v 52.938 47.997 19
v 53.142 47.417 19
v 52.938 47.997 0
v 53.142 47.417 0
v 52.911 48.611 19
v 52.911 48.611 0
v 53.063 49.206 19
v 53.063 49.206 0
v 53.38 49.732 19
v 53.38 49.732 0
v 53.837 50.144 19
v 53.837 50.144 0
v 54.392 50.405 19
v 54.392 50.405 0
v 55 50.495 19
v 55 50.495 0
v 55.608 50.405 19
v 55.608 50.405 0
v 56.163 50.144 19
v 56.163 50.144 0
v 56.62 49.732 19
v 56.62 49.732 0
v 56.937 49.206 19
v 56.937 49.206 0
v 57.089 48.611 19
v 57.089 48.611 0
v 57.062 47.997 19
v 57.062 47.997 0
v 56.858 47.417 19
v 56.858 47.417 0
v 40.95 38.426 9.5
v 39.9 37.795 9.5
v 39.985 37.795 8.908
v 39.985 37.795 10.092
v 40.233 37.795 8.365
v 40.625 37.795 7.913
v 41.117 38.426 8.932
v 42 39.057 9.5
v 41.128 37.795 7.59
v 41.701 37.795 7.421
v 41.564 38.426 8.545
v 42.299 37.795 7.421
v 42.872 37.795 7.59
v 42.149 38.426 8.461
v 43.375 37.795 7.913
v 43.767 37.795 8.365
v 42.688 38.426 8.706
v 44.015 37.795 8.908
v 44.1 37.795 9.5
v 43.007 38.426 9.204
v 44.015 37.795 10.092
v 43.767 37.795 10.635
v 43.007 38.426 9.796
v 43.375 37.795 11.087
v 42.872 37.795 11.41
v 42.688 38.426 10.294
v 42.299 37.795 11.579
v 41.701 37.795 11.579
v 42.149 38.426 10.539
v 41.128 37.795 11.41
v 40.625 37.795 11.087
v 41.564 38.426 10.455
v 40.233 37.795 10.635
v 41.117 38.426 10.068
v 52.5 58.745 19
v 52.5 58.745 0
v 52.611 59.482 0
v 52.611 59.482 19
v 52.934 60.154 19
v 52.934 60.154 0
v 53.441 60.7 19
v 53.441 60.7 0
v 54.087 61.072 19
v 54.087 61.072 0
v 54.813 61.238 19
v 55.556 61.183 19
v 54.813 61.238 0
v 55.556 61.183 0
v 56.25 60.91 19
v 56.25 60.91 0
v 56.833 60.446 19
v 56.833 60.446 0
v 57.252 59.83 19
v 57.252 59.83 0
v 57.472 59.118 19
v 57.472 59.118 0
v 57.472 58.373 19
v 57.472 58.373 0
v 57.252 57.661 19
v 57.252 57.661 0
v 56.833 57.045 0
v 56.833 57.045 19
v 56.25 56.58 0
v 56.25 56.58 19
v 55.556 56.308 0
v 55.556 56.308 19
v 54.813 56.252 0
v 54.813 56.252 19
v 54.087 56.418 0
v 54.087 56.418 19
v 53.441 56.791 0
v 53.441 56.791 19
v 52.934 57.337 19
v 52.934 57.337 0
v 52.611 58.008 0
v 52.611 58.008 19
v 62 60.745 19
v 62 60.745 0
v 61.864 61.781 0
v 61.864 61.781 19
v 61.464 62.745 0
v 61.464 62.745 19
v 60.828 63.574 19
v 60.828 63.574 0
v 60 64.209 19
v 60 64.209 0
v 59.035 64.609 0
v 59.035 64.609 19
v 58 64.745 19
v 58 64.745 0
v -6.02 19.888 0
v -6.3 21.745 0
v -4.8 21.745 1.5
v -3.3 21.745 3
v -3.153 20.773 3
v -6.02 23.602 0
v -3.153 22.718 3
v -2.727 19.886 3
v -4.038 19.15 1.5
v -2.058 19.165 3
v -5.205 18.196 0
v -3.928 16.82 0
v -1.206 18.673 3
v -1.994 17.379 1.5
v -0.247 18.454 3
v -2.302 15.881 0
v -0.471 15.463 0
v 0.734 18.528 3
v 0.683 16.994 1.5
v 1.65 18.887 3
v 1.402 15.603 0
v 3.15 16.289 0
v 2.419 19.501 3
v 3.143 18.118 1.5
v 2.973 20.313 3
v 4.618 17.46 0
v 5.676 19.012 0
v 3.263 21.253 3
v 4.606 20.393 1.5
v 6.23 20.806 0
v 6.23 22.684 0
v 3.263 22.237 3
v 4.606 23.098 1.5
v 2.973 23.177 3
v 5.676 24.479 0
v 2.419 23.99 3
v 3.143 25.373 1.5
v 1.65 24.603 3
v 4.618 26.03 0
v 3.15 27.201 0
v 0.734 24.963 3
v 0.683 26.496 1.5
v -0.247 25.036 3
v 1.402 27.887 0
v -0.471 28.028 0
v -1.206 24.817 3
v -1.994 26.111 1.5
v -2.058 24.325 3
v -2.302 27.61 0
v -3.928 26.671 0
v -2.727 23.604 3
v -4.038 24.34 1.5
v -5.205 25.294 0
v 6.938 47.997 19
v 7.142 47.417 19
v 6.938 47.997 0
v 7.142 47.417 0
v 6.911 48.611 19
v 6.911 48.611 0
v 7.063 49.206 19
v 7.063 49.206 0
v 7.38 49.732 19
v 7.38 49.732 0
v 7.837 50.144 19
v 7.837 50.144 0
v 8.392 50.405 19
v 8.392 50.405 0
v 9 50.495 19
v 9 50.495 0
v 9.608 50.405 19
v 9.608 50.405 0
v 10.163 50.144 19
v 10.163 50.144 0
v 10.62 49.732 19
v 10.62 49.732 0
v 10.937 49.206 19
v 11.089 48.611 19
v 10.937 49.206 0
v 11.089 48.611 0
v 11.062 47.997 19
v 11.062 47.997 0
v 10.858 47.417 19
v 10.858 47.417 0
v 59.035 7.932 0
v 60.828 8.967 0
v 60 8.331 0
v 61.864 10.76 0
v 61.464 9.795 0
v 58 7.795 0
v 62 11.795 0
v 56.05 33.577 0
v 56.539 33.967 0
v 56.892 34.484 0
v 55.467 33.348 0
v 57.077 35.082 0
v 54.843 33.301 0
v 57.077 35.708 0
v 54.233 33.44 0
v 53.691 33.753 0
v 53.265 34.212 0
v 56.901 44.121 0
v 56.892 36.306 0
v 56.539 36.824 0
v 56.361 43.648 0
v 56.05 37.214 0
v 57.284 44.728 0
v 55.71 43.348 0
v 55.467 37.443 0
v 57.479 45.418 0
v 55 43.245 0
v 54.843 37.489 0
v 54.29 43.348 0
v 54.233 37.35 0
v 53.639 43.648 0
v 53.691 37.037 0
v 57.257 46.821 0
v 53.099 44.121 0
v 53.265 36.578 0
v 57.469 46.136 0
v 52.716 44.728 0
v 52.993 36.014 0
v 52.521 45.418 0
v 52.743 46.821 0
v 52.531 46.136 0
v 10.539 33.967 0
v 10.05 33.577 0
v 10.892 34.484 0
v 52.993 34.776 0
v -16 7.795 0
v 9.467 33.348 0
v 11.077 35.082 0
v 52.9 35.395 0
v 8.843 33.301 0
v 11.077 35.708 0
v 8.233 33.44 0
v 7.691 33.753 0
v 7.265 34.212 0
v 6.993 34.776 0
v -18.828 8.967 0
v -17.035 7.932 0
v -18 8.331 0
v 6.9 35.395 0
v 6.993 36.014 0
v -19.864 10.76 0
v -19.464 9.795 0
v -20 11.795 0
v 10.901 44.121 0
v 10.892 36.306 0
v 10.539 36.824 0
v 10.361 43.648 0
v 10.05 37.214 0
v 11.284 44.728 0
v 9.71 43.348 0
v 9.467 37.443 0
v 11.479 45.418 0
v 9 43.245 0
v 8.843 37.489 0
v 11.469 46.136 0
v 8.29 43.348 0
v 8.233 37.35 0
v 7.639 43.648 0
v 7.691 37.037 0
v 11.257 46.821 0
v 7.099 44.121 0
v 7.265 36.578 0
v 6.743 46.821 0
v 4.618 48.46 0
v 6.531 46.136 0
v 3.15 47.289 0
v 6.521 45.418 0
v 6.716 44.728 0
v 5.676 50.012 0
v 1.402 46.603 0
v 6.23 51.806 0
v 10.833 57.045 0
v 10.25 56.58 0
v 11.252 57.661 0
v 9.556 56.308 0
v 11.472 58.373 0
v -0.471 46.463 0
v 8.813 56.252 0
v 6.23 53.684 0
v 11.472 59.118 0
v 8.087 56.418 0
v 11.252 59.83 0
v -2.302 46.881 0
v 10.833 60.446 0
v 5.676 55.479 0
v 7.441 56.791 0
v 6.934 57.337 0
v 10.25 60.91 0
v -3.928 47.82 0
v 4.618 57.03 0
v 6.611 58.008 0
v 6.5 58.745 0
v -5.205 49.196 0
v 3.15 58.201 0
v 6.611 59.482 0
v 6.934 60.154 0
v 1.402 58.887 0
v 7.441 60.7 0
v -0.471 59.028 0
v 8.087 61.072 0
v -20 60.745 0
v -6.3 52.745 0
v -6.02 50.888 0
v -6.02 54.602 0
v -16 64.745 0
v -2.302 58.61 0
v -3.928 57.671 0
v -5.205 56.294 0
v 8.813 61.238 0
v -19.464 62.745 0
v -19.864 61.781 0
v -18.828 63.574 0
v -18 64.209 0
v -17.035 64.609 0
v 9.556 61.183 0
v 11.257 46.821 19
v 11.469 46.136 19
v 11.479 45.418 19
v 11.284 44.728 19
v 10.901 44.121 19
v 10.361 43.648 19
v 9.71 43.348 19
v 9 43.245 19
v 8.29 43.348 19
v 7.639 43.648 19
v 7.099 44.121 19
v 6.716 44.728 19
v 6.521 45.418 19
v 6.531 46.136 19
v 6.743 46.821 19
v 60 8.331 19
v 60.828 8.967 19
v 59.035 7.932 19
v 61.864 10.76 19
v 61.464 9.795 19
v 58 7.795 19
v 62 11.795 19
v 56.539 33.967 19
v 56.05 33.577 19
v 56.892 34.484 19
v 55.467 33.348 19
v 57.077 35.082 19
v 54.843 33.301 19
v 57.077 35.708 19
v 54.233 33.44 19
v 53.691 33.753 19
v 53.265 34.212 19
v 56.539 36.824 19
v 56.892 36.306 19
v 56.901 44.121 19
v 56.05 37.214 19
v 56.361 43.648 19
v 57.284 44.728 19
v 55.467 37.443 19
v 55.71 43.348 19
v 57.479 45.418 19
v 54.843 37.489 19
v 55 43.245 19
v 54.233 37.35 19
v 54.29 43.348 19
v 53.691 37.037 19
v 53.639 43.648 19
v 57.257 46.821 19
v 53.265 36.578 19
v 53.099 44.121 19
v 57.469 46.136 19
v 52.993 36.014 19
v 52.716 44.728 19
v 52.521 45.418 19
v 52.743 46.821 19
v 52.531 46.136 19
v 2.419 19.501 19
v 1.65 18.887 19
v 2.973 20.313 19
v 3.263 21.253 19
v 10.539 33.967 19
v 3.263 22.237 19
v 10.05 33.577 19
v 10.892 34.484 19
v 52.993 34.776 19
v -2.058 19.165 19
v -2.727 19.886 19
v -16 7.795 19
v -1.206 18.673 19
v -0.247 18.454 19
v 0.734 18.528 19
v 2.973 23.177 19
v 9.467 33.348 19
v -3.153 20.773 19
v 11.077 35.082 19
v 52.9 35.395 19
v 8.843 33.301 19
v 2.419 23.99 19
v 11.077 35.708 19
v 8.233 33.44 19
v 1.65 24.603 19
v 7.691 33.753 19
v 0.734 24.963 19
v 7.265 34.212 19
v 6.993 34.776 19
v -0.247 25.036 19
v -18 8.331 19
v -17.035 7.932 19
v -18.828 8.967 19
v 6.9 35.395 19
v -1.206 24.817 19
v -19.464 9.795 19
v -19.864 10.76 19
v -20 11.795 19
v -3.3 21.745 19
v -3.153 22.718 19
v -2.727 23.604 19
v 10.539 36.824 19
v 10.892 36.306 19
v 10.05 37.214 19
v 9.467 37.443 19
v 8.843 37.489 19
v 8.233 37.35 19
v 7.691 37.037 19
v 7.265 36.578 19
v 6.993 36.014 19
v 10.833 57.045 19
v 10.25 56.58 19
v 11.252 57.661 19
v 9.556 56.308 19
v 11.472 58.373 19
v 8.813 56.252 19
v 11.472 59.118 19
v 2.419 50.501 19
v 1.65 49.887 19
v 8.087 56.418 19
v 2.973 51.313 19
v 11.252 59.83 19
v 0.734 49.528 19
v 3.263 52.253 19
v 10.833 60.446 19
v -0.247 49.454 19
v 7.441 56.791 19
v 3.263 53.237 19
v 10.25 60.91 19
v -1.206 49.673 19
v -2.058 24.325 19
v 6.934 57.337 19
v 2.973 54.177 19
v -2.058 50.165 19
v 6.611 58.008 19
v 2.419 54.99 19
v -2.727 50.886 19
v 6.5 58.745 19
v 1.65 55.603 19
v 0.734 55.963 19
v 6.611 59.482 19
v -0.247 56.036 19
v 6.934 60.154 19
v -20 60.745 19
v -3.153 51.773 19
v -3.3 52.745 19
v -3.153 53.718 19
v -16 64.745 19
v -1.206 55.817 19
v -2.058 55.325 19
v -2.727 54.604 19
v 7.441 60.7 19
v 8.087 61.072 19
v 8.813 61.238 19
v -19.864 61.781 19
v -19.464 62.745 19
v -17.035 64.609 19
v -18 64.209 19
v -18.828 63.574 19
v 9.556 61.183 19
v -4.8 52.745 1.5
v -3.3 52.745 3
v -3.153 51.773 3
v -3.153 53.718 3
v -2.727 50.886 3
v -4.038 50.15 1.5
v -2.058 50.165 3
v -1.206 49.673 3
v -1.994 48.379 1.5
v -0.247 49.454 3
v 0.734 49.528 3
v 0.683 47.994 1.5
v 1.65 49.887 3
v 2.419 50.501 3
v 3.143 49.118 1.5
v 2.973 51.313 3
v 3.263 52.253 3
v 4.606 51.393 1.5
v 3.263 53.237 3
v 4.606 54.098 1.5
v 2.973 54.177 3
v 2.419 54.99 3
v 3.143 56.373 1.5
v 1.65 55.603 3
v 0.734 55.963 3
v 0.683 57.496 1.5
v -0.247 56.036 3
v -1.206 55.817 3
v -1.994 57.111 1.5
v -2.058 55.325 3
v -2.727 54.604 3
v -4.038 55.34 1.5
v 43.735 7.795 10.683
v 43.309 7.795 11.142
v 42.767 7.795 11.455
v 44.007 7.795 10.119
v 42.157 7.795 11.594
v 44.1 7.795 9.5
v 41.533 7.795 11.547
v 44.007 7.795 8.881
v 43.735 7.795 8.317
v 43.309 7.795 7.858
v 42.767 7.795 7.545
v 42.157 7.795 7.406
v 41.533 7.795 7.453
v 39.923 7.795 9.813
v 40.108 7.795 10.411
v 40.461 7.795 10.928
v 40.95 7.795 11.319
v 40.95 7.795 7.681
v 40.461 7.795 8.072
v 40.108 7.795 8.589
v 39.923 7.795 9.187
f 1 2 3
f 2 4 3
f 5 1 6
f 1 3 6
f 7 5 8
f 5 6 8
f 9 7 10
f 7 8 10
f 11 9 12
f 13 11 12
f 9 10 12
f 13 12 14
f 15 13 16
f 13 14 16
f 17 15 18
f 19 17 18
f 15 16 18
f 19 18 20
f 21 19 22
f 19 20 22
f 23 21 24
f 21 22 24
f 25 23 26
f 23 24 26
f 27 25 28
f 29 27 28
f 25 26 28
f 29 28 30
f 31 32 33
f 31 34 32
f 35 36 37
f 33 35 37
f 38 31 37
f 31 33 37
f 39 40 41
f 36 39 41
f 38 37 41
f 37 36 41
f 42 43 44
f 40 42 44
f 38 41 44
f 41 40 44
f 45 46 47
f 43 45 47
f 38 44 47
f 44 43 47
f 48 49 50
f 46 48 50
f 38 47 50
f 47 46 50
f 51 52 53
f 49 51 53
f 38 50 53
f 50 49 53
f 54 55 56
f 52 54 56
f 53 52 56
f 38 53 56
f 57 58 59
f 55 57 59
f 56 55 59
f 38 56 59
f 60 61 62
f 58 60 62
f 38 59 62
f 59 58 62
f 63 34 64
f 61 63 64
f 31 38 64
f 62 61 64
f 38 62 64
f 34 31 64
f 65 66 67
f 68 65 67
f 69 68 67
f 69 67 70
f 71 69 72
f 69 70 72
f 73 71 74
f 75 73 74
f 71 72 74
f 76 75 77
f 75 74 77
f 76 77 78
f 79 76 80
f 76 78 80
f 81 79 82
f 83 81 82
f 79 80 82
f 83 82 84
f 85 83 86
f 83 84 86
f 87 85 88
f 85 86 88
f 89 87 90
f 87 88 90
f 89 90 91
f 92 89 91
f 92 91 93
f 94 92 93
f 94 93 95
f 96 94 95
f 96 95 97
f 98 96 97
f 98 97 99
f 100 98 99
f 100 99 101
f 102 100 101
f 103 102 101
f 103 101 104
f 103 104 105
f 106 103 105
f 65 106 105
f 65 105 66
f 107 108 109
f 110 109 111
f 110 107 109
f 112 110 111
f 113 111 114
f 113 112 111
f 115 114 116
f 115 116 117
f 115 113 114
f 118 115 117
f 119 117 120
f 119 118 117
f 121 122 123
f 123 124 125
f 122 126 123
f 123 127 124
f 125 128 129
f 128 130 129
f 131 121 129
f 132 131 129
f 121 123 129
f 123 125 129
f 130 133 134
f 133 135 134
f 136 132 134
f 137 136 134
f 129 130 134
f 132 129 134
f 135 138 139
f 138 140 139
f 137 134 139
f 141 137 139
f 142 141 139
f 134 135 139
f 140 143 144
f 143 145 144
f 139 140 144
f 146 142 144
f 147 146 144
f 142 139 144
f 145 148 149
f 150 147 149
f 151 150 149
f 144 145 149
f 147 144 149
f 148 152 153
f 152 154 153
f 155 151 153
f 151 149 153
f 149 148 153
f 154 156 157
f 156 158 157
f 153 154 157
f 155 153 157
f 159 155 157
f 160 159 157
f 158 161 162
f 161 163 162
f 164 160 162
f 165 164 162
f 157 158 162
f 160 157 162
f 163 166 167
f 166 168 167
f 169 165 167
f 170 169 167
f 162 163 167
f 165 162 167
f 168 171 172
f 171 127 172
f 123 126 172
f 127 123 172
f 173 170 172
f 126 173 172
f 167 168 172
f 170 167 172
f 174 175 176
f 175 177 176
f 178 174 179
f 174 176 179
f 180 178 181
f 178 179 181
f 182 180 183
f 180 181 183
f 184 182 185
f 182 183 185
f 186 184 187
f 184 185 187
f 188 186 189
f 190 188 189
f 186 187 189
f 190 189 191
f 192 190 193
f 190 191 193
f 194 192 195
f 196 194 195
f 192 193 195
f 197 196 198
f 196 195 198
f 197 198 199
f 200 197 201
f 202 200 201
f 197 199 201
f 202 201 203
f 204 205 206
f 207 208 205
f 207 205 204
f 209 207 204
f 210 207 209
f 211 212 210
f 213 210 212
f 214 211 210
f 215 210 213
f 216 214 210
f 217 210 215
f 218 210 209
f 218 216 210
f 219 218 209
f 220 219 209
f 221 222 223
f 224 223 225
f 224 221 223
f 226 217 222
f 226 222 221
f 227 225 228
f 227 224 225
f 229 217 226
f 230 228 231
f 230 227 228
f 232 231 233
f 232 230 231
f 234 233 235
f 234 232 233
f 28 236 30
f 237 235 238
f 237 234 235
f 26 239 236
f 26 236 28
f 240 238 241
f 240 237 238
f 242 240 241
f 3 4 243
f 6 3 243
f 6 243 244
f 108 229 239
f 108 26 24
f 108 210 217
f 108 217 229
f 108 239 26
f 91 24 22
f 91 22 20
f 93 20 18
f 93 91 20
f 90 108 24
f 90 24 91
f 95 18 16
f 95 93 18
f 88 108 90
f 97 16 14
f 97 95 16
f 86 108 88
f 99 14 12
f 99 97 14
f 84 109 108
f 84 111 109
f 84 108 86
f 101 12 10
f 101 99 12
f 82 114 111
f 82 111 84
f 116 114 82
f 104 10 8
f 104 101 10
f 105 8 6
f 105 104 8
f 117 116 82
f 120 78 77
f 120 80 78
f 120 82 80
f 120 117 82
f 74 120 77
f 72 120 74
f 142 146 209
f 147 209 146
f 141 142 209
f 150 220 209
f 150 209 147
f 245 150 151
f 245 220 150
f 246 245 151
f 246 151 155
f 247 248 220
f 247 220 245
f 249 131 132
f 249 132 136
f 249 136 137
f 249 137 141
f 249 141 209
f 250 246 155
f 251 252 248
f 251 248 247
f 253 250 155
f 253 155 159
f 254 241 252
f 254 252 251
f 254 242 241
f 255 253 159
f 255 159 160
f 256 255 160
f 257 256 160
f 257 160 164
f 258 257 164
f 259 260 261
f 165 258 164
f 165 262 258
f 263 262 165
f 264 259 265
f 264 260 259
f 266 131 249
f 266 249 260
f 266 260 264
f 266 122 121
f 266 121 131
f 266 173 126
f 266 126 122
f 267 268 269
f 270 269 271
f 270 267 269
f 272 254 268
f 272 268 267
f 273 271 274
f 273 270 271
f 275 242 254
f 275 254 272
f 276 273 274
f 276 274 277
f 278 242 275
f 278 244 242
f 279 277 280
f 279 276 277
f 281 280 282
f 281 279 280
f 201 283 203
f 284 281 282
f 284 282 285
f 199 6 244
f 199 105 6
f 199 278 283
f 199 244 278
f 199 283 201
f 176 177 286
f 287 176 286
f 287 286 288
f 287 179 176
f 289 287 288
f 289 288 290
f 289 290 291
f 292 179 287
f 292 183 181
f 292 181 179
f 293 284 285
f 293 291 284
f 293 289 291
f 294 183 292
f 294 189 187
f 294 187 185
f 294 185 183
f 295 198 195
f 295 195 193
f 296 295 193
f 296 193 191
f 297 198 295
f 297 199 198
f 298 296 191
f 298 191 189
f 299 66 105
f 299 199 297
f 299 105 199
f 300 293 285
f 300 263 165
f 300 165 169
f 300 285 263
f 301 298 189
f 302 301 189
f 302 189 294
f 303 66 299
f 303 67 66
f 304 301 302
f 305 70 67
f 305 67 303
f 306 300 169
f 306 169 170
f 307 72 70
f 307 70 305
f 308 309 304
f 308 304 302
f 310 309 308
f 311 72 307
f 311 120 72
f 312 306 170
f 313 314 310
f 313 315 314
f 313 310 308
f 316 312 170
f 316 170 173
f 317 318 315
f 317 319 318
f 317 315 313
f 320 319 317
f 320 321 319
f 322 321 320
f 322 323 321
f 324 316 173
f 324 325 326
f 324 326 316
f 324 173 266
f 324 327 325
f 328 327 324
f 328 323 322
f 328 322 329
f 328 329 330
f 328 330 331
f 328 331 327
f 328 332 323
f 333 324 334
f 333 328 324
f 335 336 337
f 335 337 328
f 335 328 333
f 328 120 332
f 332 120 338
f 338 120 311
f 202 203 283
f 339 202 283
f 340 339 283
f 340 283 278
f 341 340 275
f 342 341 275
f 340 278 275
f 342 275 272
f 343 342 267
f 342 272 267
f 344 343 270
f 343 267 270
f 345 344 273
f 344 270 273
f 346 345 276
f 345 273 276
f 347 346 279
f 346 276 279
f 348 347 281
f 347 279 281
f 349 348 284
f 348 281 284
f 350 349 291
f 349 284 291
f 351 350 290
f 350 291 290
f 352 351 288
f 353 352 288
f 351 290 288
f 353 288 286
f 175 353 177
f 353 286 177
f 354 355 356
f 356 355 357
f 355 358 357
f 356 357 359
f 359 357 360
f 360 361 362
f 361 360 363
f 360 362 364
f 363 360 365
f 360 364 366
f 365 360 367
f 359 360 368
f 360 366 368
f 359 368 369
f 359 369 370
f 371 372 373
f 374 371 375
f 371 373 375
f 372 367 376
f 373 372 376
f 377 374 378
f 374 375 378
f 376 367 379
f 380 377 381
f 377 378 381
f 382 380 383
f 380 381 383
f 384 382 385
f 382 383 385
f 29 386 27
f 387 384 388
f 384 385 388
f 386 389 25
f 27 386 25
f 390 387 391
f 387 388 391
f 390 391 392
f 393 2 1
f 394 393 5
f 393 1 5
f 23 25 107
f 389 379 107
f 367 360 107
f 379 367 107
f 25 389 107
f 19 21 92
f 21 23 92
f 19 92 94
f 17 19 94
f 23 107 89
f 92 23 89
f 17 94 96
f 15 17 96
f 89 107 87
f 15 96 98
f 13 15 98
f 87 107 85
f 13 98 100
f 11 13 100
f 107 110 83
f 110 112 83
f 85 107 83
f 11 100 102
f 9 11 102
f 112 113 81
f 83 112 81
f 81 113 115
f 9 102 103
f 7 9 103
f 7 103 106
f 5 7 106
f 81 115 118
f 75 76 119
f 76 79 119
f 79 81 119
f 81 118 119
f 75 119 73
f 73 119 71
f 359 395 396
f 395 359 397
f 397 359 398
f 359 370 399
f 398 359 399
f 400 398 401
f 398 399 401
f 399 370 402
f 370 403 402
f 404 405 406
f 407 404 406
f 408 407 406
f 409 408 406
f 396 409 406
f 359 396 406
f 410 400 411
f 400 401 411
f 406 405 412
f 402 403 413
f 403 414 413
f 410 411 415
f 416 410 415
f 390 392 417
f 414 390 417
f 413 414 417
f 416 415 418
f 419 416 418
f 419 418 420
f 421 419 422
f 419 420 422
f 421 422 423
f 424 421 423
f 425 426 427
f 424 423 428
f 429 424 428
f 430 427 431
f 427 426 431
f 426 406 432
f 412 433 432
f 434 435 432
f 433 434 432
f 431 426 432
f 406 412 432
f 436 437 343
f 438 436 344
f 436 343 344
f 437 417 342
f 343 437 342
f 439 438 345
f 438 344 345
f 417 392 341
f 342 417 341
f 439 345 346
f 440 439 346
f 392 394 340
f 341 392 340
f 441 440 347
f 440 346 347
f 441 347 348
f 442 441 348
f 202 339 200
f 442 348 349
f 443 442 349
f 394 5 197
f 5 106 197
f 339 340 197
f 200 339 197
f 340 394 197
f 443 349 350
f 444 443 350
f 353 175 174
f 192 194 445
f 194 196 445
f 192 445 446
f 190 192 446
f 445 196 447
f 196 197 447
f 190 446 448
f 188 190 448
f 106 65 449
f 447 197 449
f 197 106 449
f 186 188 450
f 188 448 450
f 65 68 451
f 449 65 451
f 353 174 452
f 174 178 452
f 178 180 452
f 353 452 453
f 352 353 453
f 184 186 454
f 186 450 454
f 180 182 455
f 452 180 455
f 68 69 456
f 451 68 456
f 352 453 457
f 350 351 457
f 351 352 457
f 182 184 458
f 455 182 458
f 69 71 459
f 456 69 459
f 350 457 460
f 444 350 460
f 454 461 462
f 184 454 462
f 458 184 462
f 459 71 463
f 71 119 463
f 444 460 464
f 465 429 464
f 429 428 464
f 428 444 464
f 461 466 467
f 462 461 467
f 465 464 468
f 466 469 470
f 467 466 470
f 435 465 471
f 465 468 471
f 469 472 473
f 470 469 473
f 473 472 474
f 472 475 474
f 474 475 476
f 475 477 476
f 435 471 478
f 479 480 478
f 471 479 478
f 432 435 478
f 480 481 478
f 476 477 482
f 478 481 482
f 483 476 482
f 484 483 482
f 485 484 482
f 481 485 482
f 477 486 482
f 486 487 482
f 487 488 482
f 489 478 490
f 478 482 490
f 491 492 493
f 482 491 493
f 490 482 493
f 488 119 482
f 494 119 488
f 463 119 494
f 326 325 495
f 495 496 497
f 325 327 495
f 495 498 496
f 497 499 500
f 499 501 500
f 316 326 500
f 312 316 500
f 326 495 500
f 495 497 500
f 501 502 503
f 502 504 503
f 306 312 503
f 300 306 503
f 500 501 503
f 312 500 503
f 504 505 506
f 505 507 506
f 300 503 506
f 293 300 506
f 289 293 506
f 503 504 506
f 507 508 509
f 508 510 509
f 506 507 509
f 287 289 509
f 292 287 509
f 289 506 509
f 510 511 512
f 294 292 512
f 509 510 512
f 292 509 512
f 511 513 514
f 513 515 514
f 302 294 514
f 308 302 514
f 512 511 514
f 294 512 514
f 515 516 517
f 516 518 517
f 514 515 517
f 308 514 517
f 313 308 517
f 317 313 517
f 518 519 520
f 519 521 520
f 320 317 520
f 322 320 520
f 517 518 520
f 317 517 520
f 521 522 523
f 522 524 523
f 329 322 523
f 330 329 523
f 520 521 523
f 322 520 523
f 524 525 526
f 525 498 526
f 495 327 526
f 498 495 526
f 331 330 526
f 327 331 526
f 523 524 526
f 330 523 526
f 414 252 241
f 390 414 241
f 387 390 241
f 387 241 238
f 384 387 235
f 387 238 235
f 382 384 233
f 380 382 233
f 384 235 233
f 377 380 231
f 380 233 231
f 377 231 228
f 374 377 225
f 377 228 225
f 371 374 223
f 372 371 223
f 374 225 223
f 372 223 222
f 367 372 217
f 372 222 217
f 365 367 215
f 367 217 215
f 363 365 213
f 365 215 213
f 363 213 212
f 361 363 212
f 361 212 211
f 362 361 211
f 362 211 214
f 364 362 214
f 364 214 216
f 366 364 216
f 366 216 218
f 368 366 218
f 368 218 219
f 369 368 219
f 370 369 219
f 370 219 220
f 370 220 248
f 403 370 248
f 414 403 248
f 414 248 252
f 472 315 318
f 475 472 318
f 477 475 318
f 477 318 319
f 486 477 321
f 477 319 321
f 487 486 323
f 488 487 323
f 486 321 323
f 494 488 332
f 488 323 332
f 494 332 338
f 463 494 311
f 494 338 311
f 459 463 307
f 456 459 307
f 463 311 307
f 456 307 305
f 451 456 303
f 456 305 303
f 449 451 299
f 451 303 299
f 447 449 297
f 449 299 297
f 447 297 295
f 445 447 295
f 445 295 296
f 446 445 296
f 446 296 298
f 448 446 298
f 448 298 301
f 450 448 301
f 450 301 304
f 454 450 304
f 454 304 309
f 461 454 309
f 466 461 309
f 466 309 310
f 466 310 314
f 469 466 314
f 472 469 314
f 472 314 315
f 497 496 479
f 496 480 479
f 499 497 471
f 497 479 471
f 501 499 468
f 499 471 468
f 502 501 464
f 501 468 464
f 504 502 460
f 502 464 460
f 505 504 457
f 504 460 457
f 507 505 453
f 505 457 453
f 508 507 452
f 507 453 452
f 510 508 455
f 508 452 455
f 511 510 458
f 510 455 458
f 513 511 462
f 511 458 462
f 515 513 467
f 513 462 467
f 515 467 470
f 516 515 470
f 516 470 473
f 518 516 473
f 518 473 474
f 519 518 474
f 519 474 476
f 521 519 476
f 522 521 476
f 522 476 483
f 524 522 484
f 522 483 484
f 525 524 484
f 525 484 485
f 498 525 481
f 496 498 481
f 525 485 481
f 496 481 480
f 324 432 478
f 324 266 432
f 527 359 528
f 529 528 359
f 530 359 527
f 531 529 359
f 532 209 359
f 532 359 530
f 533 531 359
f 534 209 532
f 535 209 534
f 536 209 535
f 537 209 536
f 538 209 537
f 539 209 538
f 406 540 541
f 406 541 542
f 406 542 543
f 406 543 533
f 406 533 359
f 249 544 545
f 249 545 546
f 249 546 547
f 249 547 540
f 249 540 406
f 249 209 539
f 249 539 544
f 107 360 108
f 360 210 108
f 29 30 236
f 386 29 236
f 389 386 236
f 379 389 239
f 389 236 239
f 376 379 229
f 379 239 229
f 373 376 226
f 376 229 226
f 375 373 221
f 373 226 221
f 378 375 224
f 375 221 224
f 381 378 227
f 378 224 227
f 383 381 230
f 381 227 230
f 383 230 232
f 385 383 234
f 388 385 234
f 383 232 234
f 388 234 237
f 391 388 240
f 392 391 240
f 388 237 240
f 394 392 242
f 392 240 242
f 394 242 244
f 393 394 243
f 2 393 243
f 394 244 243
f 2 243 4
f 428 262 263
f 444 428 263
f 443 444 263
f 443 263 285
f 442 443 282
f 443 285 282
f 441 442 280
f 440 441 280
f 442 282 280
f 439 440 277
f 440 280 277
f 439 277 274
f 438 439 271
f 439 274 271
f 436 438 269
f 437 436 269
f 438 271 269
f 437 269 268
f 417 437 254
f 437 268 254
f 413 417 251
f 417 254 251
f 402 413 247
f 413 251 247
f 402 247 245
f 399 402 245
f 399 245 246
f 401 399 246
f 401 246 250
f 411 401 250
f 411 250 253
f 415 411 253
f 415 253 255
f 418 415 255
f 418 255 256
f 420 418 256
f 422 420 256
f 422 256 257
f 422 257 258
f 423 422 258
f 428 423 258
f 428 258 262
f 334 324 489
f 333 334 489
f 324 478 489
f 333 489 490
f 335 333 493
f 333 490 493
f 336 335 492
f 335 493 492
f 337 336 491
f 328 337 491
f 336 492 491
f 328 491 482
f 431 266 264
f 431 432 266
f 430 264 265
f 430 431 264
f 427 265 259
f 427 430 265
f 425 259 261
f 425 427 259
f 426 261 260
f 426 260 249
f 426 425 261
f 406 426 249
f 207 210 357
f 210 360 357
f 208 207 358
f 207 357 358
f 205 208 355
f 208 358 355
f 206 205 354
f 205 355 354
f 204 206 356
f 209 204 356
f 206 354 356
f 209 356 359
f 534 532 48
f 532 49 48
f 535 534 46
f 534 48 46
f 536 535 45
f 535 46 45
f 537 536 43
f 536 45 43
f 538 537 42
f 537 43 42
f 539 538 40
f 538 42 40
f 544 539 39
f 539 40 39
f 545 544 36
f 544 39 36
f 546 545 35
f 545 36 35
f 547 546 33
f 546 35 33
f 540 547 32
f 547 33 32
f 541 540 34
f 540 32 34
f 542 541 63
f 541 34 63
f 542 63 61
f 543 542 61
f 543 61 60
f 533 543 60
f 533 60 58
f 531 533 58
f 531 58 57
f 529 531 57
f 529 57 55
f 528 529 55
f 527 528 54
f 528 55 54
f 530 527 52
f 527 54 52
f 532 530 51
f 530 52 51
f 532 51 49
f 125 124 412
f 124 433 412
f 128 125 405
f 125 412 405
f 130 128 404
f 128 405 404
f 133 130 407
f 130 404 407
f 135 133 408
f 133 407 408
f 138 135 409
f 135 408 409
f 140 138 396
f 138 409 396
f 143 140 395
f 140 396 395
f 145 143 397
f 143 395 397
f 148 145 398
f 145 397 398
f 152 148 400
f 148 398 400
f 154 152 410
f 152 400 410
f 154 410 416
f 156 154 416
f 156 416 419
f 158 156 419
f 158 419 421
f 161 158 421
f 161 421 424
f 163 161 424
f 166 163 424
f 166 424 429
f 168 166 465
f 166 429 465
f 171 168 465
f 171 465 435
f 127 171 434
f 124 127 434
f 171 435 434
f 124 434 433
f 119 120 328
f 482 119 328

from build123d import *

# Parameters (mm, degrees)
SKETCH1_W                                           = 81.999999998
SKETCH1_H                                           = 60
BOSS_EXTRUDE1_DEPTH                                 = 19
TAP_DRILL_FOR_M6_TAP1_D                             = 5
CSK_FOR_M6_COUNTERSUNK_FLAT_HEAD_SCREW1_D           = 6.6
CSK_FOR_M6_COUNTERSUNK_FLAT_HEAD_SCREW1_CSINK_D     = 12.6
CSK_FOR_M6_COUNTERSUNK_FLAT_HEAD_SCREW1_CSINK_ANGLE = 90
SKETCH7_W                                           = 81.999999998
SKETCH7_H                                           = 4
CUT_EXTRUDE1_DEPTH                                  = 20
SKETCH10_W                                          = 81.999999998
SKETCH10_H                                          = 0.95
BOSS_EXTRUDE2_DEPTH                                 = 19
FILLET1_R                                           = 4
TAP_DRILL_FOR_M5_TAP1_D                             = 4.2
TAP_DRILL_FOR_M5_TAP1_DEPTH                         = 30
TAP_DRILL_FOR_M5_TAP1_TIP                           = 1.2618073
TAP_DRILL_FOR_M5_TAP2_D                             = 4.2


with BuildPart() as part:
    # Sketch1 → Boss-Extrude1 (new body)
    with BuildSketch(Plane.XY):
        with Locations((20.999999999, 38.745248777)):
            Rectangle(SKETCH1_W, SKETCH1_H)
    extrude(amount=BOSS_EXTRUDE1_DEPTH)

    # Tap Drill for M6 Tap1 (through all)
    with Locations(Plane.XY.offset(19)):
        with Locations((8.999999998, 58.745248777), (54.999999998, 58.745248777), (54.999999998, 45.745248777), (8.999999998, 45.745248777)):
            Hole(TAP_DRILL_FOR_M6_TAP1_D / 2)

    # CSK for M6 Countersunk Flat Head Screw1 (through all)
    with Locations(Plane(origin=(0, 0, 0), x_dir=(1, 0, 0), z_dir=(0, 0, -1))):
        with Locations((0, -21.745248777), (0, -52.745248777)):
            CounterSinkHole(CSK_FOR_M6_COUNTERSUNK_FLAT_HEAD_SCREW1_D / 2, CSK_FOR_M6_COUNTERSUNK_FLAT_HEAD_SCREW1_CSINK_D / 2, counter_sink_angle=CSK_FOR_M6_COUNTERSUNK_FLAT_HEAD_SCREW1_CSINK_ANGLE)

    # Sketch7 → Cut-Extrude1 (cut, through all)
    with BuildSketch(Plane(origin=(0, 0, 0), x_dir=(-1, 0, 0), z_dir=(0, 0, -1))):
        with Locations((-20.999999999, 66.745248777)):
            Rectangle(SKETCH7_W, SKETCH7_H)
    extrude(amount=-CUT_EXTRUDE1_DEPTH, mode=Mode.SUBTRACT)

    # Sketch10 → Boss-Extrude2 (add)
    with BuildSketch(Plane(origin=(0, 0, 0), x_dir=(-1, 0, 0), z_dir=(0, 0, -1))):
        with Locations((-20.999999999, 8.270248777)):
            Rectangle(SKETCH10_W, SKETCH10_H)
    extrude(amount=-BOSS_EXTRUDE2_DEPTH)

    # Fillet1
    fillet1_edges = [part.edges().sort_by_distance(p)[0] for p in [
        (-20, 64.745248777, 9.5),
        (61.999999998, 64.745248777, 9.5),
        (61.999999998, 7.795248777, 9.5),
        (-20, 7.795248777, 9.5),
    ]]
    fillet(fillet1_edges, radius=FILLET1_R)

    # Tap Drill for M5 Tap1
    with Locations(Plane(origin=(0, 7.795248777, 0), x_dir=(-1, 0, 0), z_dir=(0, -1, 0))):
        with Locations((-41.999999998, -9.499999998)):
            Hole(TAP_DRILL_FOR_M5_TAP1_D / 2, depth=TAP_DRILL_FOR_M5_TAP1_DEPTH)
            with Locations((0, 0, -(TAP_DRILL_FOR_M5_TAP1_DEPTH + TAP_DRILL_FOR_M5_TAP1_TIP / 2))):  # 118° drill point
                Cone(0, TAP_DRILL_FOR_M5_TAP1_D / 2, TAP_DRILL_FOR_M5_TAP1_TIP, mode=Mode.SUBTRACT)

    # Tap Drill for M5 Tap2 (through all)
    with Locations(Plane.XY.offset(19)):
        with Locations((54.999999998, 35.395248777), (54.999999998, 48.395248777), (8.999999998, 35.395248777), (8.999999998, 48.395248777)):
            Hole(TAP_DRILL_FOR_M5_TAP2_D / 2)


solid = part.part
